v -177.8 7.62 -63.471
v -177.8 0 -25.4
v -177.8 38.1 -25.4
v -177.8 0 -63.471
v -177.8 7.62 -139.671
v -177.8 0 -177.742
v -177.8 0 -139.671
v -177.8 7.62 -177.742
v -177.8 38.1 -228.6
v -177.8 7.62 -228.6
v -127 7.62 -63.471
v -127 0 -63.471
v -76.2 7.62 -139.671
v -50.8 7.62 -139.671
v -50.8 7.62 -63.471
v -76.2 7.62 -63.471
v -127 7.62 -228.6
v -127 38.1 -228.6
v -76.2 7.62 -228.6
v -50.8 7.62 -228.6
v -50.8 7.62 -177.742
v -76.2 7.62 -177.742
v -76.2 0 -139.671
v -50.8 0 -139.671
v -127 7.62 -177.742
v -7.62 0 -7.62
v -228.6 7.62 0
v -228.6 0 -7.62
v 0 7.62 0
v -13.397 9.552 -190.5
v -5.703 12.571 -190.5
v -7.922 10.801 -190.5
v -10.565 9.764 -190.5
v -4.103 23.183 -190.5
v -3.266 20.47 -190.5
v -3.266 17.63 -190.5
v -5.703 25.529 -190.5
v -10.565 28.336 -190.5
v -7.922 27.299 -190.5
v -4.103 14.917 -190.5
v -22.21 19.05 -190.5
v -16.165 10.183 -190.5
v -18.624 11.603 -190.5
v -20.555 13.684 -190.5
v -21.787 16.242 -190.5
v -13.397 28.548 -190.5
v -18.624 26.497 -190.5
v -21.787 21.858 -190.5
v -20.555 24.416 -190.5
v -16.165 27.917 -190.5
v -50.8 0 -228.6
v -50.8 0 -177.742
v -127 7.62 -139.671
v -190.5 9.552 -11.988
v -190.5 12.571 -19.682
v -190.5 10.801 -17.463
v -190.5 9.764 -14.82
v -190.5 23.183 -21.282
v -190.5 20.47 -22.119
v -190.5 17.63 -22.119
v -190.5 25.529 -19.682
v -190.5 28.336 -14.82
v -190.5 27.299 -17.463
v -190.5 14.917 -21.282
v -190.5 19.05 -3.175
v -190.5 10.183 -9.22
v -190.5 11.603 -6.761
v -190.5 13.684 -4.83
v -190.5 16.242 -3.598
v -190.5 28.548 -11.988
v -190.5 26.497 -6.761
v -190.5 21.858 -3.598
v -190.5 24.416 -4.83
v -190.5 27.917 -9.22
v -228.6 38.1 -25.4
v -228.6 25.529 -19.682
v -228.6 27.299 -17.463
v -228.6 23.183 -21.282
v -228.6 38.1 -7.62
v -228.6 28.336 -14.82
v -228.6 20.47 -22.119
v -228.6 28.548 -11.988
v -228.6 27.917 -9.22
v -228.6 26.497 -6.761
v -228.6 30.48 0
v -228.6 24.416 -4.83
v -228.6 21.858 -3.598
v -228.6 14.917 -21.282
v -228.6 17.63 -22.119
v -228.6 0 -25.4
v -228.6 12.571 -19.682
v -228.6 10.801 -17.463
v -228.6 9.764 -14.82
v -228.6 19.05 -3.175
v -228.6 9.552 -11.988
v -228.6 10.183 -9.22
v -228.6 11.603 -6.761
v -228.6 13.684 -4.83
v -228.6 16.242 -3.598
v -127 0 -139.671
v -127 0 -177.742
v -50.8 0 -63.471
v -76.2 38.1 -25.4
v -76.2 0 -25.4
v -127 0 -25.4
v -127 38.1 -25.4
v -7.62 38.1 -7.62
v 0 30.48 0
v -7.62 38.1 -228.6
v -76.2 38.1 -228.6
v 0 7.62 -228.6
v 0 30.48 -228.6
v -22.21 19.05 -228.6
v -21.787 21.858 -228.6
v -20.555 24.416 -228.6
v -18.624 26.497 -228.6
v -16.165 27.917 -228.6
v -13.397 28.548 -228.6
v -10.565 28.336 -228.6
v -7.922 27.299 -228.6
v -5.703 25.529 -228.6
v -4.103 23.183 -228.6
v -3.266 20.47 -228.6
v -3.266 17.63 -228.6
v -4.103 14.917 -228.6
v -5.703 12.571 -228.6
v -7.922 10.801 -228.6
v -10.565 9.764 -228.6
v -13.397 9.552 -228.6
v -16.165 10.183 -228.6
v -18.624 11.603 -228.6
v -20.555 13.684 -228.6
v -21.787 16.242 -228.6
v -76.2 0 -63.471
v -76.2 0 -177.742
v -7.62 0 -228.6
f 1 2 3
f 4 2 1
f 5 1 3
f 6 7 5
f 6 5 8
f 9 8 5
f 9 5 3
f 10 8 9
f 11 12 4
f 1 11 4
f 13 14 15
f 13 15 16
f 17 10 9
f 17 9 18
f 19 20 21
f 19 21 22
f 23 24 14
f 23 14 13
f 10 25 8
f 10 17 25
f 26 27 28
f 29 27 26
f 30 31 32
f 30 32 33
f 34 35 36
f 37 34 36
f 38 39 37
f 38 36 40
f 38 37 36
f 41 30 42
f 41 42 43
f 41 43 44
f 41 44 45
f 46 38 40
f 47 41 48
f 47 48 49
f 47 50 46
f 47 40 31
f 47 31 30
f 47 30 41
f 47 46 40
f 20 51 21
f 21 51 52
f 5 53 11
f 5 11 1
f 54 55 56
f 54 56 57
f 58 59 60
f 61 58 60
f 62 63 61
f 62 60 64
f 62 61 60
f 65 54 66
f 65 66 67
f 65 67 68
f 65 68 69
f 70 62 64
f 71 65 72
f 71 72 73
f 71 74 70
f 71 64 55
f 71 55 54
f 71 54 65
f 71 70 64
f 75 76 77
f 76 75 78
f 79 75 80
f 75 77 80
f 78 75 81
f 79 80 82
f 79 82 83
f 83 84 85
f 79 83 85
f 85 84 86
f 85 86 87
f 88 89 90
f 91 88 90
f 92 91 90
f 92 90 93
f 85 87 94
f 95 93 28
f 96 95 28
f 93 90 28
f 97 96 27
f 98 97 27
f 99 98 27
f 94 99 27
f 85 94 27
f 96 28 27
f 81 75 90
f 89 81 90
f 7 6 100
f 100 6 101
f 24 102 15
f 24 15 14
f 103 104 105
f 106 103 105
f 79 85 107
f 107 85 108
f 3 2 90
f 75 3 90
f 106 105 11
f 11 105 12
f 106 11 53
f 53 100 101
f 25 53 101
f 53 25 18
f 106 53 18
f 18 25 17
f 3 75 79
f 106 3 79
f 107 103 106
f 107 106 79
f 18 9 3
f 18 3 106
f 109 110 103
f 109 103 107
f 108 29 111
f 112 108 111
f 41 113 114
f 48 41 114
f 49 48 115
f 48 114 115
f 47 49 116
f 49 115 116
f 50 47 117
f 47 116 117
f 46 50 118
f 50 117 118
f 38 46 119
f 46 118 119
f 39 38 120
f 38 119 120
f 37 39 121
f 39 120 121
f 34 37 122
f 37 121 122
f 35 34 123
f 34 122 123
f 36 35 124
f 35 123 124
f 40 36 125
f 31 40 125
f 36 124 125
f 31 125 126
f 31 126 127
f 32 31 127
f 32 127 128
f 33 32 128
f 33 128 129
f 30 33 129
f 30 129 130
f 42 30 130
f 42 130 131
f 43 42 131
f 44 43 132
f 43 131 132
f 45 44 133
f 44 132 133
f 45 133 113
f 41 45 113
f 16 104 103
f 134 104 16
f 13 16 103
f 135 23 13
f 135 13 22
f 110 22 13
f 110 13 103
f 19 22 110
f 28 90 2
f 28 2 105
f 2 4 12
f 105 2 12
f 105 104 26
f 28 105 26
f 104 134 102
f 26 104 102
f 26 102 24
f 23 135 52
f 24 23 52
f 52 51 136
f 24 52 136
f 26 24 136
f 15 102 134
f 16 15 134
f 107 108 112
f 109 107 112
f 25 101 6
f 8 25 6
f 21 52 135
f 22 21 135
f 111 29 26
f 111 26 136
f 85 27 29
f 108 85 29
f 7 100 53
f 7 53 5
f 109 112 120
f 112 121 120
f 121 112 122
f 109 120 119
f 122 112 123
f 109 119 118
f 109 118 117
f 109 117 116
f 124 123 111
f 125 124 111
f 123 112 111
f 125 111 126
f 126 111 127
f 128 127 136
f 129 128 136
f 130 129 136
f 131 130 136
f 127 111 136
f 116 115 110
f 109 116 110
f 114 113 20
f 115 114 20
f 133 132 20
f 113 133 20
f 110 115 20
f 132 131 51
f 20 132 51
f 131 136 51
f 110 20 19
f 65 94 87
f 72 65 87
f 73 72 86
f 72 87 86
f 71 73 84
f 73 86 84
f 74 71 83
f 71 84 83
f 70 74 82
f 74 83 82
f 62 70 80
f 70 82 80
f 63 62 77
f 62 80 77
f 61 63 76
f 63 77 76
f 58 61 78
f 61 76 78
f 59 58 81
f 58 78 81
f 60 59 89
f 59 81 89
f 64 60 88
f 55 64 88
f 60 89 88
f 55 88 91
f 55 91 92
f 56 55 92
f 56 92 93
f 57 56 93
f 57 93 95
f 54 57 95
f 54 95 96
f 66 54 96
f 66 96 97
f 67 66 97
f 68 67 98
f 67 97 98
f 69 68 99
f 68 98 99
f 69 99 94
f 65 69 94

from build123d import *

# Parameters (mm, degrees)
SKETCH1_W           = 50.8
SKETCH1_H           = 203.2
BOSS_EXTRUDE1_DEPTH = 38.1
SKETCH3_R           = 9.525
CUT_EXTRUDE1_DEPTH  = 38.1
SKETCH4_R           = 9.525
CUT_EXTRUDE2_DEPTH  = 38.1
CUT_EXTRUDE3_DEPTH  = 7.62
SKETCH6_W           = 127
SKETCH6_H           = 76.2
CUT_EXTRUDE4_DEPTH  = 7.62
CHAMFER1_SIZE       = 7.62


with BuildPart() as part:
    # Sketch1 → Boss-Extrude1 (new body)
    with BuildSketch(Plane(origin=(0, 0, 0), x_dir=(1, 0, 0), z_dir=(0, 1, 0))):
        Polygon((-25.4, 228.6), (-25.4, 25.4), (-76.2, 25.4), (-127, 25.4), (-177.8, 25.4), (-228.6, 25.4), (-228.6, 0), (0, 0), (0, 228.6), align=None)
        with Locations((-50.8, 127)):
            Rectangle(SKETCH1_W, SKETCH1_H)
        with Locations((-152.4, 127)):
            Rectangle(SKETCH1_W, SKETCH1_H)
    extrude(amount=BOSS_EXTRUDE1_DEPTH)

    # Sketch3 → Cut-Extrude1 (cut)
    with BuildSketch(Plane.ZY.offset(228.6)):
        with Locations((-12.7, 19.05)):
            Circle(SKETCH3_R)
    extrude(amount=-CUT_EXTRUDE1_DEPTH, mode=Mode.SUBTRACT)

    # Sketch4 → Cut-Extrude2 (cut)
    with BuildSketch(Plane(origin=(0, 0, -228.6), x_dir=(-1, 0, 0), z_dir=(0, 0, -1))):
        with Locations((12.684892179, 19.05)):
            Circle(SKETCH4_R)
    extrude(amount=-CUT_EXTRUDE2_DEPTH, mode=Mode.SUBTRACT)

    # Sketch5 → Cut-Extrude3 (cut)
    with BuildSketch(Plane(origin=(0, 0, 0), x_dir=(-1, 0, 0), z_dir=(0, -1, 0))):
        Polygon((50.8, 431.742057994), (50.8, 177.742057994), (279.4, 177.742057994), (279.4, 431.771028997), align=None)
    extrude(amount=-CUT_EXTRUDE3_DEPTH, mode=Mode.SUBTRACT)

    # Sketch6 → Cut-Extrude4 (cut)
    with BuildSketch(Plane(origin=(0, 0, 0), x_dir=(-1, 0, 0), z_dir=(0, -1, 0))):
        with Locations((114.3, 101.571028997)):
            Rectangle(SKETCH6_W, SKETCH6_H)
    extrude(amount=-CUT_EXTRUDE4_DEPTH, mode=Mode.SUBTRACT)

    # Chamfer1
    chamfer1_edges = [part.edges().sort_by_distance(p)[0] for p in [
        (0, 0, -114.3),
        (-114.3, 0, 0),
        (-114.3, 38.1, 0),
        (0, 38.1, -114.3),
    ]]
    chamfer(chamfer1_edges, length=CHAMFER1_SIZE)


solid = part.part
